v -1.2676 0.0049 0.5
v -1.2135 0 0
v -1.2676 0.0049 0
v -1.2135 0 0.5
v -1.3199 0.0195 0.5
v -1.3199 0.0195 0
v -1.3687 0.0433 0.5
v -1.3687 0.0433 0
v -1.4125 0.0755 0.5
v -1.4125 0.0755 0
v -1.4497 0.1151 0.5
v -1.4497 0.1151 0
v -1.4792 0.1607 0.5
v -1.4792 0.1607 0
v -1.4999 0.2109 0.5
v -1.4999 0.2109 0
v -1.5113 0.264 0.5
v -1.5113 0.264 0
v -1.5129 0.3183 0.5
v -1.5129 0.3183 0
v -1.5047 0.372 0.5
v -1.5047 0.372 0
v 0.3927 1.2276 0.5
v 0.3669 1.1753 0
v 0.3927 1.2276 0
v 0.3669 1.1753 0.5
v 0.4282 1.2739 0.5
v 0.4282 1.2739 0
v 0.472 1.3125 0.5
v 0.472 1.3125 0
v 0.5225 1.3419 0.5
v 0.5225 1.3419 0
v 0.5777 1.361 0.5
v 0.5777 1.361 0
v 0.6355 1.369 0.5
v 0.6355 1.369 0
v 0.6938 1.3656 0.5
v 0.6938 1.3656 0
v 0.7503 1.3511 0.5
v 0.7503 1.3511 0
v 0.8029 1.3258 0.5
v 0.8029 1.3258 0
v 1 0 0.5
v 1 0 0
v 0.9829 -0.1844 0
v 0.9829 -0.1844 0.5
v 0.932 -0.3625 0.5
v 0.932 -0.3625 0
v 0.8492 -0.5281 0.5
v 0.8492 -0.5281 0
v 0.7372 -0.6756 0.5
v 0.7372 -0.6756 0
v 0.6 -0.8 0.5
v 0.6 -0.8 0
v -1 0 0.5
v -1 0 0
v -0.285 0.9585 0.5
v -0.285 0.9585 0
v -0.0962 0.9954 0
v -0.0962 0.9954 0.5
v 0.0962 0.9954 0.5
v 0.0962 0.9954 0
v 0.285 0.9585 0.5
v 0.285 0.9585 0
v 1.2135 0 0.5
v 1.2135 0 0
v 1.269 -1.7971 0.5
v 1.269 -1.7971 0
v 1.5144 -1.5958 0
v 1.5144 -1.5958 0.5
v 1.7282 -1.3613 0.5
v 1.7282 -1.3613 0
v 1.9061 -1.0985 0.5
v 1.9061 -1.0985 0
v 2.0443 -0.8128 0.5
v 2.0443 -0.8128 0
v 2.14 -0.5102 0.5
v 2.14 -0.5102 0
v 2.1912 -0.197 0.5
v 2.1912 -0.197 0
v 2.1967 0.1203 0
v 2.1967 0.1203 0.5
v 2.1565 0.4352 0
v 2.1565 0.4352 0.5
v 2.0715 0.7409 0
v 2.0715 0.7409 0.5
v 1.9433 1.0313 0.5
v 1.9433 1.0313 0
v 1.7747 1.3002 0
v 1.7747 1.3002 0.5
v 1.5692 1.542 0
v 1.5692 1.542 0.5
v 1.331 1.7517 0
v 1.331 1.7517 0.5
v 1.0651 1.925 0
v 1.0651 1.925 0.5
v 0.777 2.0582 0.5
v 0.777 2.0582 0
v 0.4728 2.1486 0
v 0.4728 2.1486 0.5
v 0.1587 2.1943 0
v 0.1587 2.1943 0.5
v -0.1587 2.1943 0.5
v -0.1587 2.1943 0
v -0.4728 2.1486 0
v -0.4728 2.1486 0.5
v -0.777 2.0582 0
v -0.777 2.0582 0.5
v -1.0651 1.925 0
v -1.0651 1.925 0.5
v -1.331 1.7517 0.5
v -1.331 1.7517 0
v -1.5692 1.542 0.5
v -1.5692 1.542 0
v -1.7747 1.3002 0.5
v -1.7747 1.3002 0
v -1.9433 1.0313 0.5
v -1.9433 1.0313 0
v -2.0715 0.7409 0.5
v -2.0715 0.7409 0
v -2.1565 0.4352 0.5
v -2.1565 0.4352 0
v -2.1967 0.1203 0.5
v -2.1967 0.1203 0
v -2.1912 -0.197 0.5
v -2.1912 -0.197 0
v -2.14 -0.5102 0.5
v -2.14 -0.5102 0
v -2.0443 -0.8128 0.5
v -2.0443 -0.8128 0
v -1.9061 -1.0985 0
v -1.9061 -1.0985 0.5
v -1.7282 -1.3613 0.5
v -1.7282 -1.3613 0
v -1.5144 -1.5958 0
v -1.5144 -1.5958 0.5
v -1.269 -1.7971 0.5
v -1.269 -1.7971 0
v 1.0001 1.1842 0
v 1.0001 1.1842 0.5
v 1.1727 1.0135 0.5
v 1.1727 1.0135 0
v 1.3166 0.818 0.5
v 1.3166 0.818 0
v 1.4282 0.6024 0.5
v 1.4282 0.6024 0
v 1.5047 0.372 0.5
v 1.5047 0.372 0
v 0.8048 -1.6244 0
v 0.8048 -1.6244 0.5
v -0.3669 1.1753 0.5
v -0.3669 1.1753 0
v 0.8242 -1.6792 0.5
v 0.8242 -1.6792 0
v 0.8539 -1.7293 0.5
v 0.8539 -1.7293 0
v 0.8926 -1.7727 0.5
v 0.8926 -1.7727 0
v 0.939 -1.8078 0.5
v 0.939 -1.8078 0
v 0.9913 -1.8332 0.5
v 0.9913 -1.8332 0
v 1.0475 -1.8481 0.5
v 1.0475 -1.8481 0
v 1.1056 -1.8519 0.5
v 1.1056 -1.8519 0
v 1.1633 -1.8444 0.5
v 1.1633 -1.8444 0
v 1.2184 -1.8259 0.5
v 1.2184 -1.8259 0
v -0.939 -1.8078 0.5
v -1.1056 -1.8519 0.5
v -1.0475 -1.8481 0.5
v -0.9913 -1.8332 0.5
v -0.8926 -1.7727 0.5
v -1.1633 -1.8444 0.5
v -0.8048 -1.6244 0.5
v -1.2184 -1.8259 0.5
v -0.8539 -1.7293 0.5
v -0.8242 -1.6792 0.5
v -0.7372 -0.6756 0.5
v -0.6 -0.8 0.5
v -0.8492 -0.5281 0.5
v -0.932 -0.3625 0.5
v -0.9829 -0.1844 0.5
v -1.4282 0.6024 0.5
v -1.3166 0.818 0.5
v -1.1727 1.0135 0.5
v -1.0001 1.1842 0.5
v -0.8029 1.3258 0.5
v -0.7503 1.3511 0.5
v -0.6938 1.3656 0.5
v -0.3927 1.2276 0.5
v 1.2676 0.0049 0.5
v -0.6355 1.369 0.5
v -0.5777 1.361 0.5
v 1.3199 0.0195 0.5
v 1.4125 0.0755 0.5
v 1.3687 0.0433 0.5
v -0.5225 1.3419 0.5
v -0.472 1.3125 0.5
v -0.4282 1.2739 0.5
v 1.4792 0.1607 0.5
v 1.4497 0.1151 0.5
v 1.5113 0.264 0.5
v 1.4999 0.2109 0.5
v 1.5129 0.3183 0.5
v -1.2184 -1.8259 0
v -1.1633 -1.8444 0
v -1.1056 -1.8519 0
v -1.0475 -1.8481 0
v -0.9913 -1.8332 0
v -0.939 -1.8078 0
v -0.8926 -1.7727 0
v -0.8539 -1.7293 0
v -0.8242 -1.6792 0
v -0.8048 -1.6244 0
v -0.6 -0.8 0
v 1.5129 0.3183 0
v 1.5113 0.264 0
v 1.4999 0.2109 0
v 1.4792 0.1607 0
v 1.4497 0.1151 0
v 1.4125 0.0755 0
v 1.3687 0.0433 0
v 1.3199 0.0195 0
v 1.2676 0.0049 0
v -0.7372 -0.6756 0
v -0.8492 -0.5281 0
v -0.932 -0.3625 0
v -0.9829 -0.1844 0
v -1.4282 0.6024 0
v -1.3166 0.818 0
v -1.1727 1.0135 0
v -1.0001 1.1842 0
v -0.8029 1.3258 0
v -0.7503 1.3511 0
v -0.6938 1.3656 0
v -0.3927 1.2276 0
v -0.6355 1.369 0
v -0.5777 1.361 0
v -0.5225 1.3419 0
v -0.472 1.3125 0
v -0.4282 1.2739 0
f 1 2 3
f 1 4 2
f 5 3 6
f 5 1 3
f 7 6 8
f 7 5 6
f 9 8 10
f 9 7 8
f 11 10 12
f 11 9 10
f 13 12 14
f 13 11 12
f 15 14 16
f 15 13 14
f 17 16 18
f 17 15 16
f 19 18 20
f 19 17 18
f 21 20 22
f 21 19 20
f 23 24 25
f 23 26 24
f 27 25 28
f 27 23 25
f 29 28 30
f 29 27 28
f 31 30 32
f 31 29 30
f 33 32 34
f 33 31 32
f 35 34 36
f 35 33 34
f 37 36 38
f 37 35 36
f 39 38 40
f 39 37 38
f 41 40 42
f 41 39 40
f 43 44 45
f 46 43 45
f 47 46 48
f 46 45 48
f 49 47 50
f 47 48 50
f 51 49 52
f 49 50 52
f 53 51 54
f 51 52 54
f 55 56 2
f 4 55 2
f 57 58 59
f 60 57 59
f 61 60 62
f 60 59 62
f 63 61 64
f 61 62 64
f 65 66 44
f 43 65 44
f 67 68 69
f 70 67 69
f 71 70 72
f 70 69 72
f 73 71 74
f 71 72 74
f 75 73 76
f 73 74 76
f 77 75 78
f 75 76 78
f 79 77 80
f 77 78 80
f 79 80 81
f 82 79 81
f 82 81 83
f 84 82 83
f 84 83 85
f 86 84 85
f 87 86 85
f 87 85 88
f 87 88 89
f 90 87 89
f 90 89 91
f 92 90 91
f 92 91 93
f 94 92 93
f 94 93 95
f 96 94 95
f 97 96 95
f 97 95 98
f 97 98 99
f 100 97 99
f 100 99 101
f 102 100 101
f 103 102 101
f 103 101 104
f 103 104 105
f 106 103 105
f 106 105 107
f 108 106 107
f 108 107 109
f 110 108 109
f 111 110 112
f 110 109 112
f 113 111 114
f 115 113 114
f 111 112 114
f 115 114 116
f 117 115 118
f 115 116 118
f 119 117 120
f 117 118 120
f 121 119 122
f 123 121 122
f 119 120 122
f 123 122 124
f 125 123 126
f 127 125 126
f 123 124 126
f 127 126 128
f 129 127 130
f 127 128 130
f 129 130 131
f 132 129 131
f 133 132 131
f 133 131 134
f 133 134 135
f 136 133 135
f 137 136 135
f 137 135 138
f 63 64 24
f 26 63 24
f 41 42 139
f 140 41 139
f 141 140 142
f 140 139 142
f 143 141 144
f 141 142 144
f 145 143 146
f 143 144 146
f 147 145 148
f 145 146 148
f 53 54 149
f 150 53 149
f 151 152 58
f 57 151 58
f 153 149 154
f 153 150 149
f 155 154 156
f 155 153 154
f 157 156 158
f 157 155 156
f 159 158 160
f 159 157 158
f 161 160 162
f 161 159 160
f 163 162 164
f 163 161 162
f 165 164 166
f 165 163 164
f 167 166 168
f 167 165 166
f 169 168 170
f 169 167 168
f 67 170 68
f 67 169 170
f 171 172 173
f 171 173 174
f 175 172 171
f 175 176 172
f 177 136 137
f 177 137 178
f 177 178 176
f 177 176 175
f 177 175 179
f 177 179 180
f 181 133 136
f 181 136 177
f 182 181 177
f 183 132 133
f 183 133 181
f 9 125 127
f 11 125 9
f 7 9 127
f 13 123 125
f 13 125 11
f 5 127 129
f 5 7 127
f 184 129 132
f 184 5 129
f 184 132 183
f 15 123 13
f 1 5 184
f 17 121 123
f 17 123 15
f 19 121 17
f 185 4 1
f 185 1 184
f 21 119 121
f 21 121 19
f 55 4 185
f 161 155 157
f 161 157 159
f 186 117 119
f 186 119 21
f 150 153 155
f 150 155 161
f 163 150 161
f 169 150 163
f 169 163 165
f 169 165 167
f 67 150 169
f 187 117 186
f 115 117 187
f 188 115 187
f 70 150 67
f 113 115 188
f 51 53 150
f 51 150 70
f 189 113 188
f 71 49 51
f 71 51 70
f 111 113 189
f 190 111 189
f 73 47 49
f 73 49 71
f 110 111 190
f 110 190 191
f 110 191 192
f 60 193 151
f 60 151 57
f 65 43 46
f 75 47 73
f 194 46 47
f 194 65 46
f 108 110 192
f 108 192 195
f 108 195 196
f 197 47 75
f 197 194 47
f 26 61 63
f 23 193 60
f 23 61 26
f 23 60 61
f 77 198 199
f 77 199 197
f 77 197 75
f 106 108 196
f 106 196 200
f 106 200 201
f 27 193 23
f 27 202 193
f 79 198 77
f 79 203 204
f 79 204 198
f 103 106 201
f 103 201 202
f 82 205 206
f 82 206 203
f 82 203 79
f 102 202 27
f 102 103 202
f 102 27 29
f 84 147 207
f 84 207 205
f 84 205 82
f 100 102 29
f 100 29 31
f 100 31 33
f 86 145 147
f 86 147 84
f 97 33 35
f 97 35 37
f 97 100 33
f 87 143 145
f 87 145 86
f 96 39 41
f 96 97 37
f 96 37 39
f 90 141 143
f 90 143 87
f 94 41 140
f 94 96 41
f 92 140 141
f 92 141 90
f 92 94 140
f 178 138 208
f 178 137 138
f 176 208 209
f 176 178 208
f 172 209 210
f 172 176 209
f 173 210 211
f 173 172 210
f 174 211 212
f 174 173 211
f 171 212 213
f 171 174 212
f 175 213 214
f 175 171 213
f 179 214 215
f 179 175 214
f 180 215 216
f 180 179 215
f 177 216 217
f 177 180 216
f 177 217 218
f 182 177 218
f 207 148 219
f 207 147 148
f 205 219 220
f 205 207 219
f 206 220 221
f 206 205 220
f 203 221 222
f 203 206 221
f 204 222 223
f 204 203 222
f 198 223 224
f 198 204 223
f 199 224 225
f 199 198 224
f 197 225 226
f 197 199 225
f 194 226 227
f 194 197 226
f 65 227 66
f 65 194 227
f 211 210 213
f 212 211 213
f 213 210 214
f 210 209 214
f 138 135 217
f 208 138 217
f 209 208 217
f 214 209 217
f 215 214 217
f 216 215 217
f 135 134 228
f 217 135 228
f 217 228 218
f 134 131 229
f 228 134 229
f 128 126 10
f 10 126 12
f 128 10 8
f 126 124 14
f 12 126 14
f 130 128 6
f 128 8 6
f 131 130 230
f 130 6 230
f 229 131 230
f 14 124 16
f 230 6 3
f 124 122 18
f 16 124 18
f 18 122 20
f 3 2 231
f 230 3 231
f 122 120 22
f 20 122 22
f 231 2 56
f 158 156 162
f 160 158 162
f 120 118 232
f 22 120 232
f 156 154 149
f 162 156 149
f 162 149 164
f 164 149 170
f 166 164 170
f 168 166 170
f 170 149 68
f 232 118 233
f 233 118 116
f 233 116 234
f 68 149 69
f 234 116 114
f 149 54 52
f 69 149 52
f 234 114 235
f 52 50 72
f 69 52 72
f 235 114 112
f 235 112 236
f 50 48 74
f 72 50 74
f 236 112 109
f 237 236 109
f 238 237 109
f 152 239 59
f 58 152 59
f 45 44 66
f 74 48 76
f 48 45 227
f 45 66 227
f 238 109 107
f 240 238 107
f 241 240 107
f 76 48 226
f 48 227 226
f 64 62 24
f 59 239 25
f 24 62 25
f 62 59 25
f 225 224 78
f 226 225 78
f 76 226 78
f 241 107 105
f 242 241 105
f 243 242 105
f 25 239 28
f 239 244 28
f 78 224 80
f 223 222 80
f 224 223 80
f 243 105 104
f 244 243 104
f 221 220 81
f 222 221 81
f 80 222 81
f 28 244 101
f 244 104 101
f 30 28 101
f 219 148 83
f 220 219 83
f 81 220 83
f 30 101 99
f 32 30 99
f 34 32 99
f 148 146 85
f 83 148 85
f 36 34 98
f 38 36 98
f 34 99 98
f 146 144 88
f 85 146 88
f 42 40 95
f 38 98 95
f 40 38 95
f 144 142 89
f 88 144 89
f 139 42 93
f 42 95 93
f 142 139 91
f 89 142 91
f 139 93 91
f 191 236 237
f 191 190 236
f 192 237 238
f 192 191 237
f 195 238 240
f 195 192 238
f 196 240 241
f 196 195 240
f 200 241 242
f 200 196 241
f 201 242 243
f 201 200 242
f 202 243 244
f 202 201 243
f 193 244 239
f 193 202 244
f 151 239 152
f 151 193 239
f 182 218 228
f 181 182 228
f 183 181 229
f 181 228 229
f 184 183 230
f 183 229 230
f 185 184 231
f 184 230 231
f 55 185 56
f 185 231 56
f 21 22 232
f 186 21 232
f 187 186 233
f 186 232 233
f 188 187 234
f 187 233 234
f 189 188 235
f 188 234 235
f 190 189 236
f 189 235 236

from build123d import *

# Parameters (mm, degrees)
BOSS_EXTRUDE1_DEPTH = 0.5
FILLET1_R           = 0.3


with BuildPart() as part:
    # Sketch2 → Boss-Extrude1 (new body)
    with BuildSketch(Plane.XY):
        with BuildLine():
            Line((0.6, -0.8), (0.899946983, -2.007509758))
            ThreePointArc((0.899946983, -2.007509758), (0, 2.2), (-0.899946983, -2.007509758))
            Line((-0.899946983, -2.007509758), (-0.6, -0.8))
            ThreePointArc((-0.6, -0.8), (-0.894427191, -0.447213595), (-1, 0))
            Line((-1, 0), (-1.55, 0))
            ThreePointArc((-1.55, 0), (-1.25421202, 0.910742669), (-0.479739085, 1.473889552))
            Line((-0.479739085, 1.473889552), (-0.285, 0.958527517))
            ThreePointArc((-0.285, 0.958527517), (0, 1), (0.285, 0.958527517))
            Line((0.285, 0.958527517), (0.479739085, 1.473889552))
            ThreePointArc((0.479739085, 1.473889552), (1.25421202, 0.910742669), (1.55, 0))
            Line((1.55, 0), (1, 0))
            ThreePointArc((1, 0), (0.894427191, -0.447213595), (0.6, -0.8))
        make_face()
    extrude(amount=BOSS_EXTRUDE1_DEPTH)

    # Fillet1
    fillet1_edges = [part.edges().sort_by_distance(p)[0] for p in [
        (1.55, 0, 0.25),
        (0.479739085, 1.473889552, 0.25),
        (-0.479739085, 1.473889552, 0.25),
        (-1.55, 0, 0.25),
        (-0.899946983, -2.007509758, 0.25),
        (0.899946983, -2.007509758, 0.25),
    ]]
    fillet(fillet1_edges, radius=FILLET1_R)


solid = part.part
